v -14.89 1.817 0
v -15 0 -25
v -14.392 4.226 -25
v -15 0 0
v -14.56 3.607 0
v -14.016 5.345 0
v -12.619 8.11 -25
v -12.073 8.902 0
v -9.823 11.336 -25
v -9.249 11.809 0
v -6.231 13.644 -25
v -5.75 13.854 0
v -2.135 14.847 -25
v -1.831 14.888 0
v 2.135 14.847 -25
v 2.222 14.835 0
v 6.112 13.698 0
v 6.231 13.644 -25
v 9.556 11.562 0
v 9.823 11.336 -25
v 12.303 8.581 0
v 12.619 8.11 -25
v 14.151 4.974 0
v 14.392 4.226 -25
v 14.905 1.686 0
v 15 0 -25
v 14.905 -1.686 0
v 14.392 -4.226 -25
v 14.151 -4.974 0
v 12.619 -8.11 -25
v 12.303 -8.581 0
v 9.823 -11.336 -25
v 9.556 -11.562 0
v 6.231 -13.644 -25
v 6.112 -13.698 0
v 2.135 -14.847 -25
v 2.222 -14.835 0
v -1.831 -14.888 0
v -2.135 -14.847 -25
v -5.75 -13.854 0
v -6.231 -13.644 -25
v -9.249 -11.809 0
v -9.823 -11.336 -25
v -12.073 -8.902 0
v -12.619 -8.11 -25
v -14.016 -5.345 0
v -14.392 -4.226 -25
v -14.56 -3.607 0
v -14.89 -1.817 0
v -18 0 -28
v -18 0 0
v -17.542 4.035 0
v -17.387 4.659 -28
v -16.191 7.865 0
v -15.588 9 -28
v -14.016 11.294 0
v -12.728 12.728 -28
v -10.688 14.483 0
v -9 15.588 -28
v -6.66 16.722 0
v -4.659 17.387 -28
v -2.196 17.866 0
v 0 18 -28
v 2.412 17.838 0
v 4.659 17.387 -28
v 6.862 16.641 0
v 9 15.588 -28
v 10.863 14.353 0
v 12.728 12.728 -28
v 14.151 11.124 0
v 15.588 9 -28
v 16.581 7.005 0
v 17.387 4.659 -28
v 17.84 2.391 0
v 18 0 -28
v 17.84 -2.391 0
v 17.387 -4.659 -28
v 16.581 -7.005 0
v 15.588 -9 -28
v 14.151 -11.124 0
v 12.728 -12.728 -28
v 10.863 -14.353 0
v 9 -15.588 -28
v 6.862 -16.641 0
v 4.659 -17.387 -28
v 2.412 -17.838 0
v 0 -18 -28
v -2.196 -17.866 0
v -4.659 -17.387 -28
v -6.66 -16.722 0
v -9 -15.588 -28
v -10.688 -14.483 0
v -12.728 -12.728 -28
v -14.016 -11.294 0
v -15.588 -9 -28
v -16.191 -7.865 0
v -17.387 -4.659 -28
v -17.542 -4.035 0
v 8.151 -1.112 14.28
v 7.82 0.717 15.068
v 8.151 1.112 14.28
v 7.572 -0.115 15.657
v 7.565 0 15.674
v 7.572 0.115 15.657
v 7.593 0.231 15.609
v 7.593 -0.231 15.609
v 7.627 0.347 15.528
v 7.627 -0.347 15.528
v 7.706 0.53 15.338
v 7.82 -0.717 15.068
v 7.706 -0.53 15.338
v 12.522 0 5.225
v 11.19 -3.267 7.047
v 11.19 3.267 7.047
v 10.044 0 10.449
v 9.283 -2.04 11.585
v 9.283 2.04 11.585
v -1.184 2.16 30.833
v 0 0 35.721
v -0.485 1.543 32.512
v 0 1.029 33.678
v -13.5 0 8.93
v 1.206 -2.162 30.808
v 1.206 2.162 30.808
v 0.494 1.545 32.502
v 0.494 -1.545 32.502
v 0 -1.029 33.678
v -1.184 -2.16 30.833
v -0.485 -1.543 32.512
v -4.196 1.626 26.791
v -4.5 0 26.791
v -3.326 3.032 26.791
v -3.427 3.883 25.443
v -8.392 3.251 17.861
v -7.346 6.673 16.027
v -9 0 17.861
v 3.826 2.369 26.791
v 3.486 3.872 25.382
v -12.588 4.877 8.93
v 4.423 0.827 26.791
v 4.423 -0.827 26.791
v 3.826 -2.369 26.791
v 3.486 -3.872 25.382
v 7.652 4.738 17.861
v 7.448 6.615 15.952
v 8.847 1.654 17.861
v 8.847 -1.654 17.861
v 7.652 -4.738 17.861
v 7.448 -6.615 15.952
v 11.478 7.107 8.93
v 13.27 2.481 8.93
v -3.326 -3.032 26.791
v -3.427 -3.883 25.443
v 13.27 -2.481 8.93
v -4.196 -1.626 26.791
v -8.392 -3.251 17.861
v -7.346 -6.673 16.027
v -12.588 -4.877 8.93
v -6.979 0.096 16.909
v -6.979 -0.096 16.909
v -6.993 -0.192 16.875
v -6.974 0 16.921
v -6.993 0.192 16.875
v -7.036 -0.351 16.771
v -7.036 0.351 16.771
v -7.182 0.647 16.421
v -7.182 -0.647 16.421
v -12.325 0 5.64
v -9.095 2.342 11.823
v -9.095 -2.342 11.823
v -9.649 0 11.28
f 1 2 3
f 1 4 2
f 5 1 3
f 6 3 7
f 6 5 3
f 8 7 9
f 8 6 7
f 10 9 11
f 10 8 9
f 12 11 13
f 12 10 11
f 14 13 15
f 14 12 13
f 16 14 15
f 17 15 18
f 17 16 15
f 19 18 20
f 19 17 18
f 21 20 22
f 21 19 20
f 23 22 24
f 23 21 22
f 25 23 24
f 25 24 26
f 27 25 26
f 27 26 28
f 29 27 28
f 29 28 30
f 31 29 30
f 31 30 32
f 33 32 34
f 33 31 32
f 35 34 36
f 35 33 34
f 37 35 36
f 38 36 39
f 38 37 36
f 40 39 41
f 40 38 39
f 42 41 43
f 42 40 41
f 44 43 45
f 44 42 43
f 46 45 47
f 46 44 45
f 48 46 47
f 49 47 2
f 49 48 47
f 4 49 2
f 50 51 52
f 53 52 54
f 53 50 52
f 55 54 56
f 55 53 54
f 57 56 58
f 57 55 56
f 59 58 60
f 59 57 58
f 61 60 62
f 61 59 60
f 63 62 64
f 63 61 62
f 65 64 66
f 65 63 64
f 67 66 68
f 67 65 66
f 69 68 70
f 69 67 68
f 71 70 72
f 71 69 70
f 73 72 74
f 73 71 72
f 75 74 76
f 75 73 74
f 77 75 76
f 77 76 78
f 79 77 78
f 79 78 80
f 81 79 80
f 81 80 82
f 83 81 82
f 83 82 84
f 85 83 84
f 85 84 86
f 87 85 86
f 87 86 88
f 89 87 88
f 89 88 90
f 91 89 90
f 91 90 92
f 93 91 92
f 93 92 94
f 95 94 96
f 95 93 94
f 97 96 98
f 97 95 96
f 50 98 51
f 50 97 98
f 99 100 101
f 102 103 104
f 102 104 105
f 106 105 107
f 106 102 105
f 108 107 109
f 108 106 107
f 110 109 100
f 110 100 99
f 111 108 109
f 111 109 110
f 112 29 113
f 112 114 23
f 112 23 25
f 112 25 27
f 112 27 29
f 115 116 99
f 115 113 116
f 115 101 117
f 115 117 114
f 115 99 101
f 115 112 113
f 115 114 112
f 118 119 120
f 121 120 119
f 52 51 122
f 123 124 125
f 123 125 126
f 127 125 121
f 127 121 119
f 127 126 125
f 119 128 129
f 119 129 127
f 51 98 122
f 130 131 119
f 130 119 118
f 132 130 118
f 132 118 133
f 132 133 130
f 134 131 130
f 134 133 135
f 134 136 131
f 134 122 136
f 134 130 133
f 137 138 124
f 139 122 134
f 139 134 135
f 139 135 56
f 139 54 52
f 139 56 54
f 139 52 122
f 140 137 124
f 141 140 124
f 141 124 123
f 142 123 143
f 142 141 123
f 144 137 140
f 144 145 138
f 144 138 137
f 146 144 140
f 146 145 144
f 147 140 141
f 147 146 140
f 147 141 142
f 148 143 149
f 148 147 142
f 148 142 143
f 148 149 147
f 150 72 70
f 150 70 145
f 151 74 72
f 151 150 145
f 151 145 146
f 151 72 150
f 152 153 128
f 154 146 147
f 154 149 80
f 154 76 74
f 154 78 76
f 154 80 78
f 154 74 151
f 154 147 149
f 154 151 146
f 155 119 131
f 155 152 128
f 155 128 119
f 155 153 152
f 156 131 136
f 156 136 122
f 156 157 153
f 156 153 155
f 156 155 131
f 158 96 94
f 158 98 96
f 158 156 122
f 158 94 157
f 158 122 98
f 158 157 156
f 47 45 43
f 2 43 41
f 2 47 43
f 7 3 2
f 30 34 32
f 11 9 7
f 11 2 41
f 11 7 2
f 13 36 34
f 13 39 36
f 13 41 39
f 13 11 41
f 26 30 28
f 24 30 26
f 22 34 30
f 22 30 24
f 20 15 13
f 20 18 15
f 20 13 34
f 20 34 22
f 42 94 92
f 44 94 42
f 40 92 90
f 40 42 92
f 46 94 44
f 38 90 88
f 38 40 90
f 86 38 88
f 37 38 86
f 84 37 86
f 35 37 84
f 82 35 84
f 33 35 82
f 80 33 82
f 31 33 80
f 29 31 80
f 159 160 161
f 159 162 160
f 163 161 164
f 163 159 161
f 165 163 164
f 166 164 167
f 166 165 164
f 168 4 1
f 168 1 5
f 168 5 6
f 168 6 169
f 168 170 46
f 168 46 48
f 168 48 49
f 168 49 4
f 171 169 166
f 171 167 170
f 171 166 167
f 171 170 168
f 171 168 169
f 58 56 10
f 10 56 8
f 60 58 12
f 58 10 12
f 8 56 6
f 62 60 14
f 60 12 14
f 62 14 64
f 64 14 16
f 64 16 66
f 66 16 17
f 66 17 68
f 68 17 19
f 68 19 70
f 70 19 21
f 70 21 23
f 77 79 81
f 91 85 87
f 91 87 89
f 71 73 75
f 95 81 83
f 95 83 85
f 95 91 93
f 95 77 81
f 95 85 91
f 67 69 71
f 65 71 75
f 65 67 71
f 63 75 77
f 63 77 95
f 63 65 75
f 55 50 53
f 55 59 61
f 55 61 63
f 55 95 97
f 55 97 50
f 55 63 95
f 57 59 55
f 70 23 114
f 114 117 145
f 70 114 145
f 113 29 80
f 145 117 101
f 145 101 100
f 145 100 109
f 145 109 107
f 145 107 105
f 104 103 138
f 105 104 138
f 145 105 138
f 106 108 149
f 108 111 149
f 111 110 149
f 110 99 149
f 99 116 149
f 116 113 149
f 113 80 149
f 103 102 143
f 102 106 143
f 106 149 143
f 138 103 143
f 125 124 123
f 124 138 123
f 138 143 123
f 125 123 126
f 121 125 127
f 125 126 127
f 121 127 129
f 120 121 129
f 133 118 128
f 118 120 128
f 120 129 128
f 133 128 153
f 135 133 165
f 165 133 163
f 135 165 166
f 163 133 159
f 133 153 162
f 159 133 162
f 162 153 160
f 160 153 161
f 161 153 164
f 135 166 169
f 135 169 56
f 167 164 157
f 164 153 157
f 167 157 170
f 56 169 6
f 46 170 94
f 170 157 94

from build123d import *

# Parameters (mm, degrees)
F3_DEPTH = 25
F4_DEPTH = 25


with BuildPart() as f1:
    # F0 (on Front) → F1 (revolve)
    with BuildSketch(Plane.XZ):
        Polygon((0, 31.622777), (0, 35.721142), (-18, 0), (-18, -28), (0, -28), (0, -25), (-15, -25), (-15, 0), align=None)
    revolve(axis=Axis((0, 0, 3.311388), (0, 0, -1)))

    # F2 (on Front) → F3 (cut)
    with BuildSketch(Plane.XZ):
        Polygon((0, 33.6782), (-14.015529, 0), (14.151254, 0), align=None)
    extrude(amount=-F3_DEPTH, mode=Mode.SUBTRACT)

    # F2 (on Front) → F4 (cut)
    with BuildSketch(Plane.XZ):
        Polygon((0, 33.6782), (-14.015529, 0), (14.151254, 0), align=None)
    extrude(amount=F4_DEPTH, mode=Mode.SUBTRACT)


solid = f1.part
